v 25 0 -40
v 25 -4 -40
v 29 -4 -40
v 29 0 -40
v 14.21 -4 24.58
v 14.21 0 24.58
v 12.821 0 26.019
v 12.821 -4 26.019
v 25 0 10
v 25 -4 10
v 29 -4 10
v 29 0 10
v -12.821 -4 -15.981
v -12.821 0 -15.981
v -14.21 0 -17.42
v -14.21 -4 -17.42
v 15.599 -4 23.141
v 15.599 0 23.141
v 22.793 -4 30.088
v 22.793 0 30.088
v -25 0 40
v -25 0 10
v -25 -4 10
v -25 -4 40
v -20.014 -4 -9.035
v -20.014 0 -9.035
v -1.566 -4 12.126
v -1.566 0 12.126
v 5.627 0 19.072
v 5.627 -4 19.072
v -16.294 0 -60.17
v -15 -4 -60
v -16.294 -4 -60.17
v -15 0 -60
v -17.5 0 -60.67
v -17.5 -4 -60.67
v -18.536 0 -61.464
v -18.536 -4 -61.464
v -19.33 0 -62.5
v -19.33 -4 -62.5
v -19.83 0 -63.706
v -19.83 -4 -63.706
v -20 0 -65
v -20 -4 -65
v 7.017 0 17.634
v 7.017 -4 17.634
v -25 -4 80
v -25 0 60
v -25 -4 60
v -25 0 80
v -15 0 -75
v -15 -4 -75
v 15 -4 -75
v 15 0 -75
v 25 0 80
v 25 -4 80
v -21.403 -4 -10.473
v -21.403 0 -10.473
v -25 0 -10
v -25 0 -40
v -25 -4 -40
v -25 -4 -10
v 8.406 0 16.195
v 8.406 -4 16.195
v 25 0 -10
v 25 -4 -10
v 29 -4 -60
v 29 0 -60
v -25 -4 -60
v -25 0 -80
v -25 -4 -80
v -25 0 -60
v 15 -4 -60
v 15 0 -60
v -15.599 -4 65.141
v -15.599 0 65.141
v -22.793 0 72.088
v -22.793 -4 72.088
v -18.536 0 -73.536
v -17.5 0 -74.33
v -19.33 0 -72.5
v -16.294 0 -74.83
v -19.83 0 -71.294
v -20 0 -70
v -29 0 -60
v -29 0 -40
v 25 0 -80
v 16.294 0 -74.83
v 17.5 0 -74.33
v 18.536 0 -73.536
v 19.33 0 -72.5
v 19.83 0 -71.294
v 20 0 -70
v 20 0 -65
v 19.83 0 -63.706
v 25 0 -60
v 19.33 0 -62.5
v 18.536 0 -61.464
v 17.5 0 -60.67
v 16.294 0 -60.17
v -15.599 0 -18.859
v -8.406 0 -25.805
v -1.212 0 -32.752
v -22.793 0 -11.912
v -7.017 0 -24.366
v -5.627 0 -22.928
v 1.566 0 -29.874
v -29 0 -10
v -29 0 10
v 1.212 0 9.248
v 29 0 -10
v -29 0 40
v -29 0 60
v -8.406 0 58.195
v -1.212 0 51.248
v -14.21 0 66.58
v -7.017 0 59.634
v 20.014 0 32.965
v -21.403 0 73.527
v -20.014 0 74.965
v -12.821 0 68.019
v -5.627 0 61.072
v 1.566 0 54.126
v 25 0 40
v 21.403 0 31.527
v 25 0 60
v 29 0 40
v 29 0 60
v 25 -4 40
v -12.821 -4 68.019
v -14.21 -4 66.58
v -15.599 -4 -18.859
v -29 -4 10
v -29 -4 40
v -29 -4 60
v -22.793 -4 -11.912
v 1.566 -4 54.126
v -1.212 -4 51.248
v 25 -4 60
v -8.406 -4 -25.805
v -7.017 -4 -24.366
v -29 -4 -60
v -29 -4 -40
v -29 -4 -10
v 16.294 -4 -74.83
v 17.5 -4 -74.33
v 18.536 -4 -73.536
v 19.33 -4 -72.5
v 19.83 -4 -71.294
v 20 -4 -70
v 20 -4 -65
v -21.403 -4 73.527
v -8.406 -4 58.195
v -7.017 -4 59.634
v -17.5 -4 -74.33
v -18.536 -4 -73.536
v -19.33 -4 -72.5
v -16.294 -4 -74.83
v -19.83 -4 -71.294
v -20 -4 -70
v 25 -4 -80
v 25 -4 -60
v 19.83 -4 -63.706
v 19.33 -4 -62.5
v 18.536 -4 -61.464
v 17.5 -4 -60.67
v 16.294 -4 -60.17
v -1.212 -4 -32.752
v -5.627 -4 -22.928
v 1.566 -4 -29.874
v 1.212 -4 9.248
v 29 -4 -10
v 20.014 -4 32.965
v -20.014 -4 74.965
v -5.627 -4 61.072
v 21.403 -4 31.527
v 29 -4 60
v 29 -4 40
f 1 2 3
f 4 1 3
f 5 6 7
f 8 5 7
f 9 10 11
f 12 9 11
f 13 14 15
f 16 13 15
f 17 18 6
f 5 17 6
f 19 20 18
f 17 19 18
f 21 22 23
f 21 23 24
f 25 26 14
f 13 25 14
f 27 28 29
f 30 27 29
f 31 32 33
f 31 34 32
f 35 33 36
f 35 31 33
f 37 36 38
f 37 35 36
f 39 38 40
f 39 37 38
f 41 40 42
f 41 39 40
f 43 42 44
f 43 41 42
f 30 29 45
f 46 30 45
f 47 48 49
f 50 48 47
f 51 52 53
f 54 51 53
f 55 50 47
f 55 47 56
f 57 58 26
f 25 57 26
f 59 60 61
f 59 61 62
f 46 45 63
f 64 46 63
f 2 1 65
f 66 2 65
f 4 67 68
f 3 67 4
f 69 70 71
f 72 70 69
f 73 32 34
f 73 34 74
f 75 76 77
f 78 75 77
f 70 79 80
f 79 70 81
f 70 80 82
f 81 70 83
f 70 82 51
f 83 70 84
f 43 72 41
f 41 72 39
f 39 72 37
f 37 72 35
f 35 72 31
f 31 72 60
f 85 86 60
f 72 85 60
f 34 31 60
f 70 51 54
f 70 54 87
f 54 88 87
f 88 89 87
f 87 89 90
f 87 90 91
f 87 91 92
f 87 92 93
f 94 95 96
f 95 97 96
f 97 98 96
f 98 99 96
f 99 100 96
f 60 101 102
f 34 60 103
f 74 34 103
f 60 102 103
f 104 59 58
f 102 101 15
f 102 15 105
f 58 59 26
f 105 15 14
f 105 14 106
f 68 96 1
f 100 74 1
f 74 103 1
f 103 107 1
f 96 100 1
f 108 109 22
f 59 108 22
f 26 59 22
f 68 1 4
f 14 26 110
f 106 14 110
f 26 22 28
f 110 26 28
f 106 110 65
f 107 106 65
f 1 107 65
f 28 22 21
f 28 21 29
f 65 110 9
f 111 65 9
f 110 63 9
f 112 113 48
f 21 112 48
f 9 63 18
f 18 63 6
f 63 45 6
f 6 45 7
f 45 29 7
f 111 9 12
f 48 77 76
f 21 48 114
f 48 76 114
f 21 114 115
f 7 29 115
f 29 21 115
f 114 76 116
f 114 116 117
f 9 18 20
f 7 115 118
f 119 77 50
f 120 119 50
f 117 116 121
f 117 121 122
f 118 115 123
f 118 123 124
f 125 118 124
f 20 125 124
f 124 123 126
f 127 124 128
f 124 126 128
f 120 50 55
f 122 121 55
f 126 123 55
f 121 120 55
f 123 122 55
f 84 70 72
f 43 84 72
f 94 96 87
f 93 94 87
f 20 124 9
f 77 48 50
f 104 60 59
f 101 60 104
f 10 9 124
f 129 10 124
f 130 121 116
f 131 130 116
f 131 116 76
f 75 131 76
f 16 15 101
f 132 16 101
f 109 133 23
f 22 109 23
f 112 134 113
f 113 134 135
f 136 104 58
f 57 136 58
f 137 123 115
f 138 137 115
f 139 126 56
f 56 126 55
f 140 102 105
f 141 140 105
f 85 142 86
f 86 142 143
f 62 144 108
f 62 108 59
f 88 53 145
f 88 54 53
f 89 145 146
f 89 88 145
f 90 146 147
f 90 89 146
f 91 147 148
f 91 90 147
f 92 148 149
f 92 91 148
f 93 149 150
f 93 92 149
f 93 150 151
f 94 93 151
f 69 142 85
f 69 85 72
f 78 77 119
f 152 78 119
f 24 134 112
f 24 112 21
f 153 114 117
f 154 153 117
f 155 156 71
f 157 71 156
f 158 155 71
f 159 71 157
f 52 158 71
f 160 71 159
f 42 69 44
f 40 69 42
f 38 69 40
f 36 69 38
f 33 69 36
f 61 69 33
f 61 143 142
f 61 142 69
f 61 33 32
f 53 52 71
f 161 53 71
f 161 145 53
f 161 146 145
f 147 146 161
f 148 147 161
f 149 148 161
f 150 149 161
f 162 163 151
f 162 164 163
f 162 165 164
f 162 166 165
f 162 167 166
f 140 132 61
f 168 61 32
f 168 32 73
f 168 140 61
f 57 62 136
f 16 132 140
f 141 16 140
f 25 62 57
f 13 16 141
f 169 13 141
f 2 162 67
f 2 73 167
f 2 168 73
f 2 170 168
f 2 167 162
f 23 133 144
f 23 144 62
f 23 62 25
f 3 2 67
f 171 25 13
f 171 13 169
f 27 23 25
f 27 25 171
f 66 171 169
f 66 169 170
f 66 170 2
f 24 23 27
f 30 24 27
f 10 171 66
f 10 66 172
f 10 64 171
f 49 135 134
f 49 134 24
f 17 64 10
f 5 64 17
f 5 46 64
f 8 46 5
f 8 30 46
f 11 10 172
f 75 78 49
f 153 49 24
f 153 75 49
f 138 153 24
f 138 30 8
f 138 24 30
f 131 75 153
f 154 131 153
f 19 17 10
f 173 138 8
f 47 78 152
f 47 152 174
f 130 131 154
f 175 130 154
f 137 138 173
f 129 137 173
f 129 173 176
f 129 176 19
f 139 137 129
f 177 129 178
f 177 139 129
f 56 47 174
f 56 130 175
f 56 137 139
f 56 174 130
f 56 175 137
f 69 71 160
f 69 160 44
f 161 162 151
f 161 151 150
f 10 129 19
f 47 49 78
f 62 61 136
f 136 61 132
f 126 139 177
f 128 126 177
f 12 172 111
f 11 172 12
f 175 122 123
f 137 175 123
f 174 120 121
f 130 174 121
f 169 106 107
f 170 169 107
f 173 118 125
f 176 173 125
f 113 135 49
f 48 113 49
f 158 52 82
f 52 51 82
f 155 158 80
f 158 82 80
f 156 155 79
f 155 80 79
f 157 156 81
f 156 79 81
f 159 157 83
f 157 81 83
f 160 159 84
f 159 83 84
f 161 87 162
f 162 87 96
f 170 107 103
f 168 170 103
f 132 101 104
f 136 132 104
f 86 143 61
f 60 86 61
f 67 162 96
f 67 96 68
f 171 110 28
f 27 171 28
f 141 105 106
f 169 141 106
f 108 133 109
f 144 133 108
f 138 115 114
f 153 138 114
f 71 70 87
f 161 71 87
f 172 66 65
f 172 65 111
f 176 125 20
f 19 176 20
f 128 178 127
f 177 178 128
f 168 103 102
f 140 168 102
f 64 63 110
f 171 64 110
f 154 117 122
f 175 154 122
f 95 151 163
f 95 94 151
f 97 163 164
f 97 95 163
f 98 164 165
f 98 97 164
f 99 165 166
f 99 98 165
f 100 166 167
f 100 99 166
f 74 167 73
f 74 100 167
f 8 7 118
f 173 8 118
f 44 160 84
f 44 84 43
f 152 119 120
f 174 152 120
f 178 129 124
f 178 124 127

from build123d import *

# Parameters (mm, degrees)
F0_W     = 50
F0_H     = 160
F1_DEPTH = 4
F2_W     = 4
F2_H     = 20
F2_H_2   = 10
F3_DEPTH = 4
F4_W     = 40
F4_H     = 15
F5_DEPTH = 25
F6_R     = 5


with BuildPart() as f1:
    # F0 (on Front) → F1 (new body)
    with BuildSketch(Plane.XZ):
        Rectangle(F0_W, F0_H)
        Polygon((-21.403301, -10.473292), (-20.013984, -9.034612), (-12.820586, -15.981196), (-14.209903, -17.419876), (-15.59922, -18.858555), (-22.792618, -11.911971), align=None, mode=Mode.SUBTRACT)
        Polygon((-1.212424, -32.751723), (-8.405822, -25.805139), (-7.016505, -24.366459), (-5.627188, -22.92778), (1.56621, -29.874363), (0.176893, -31.313043), align=None, mode=Mode.SUBTRACT)
        Polygon((-22.792618, 72.088029), (-21.403301, 73.526708), (-20.013984, 74.965388), (-12.820586, 68.018804), (-14.209903, 66.580124), (-15.59922, 65.141445), align=None, mode=Mode.SUBTRACT)
        Polygon((-8.405822, 58.194861), (-7.016505, 59.633541), (-5.627188, 61.07222), (1.56621, 54.125637), (0.176893, 52.686957), (-1.212424, 51.248277), align=None, mode=Mode.SUBTRACT)
        Polygon((5.627188, 19.07222), (7.016505, 17.633541), (8.405822, 16.194861), (1.212424, 9.248277), (-0.176893, 10.686957), (-1.56621, 12.125637), align=None, mode=Mode.SUBTRACT)
        Polygon((20.013984, 32.965388), (21.403301, 31.526708), (22.792618, 30.088029), (15.59922, 23.141445), (14.209903, 24.580124), (12.820586, 26.018804), align=None, mode=Mode.SUBTRACT)
    extrude(amount=F1_DEPTH)

    # F2 (on face) → F3 (join)
    with BuildSketch(Plane.XZ.offset(4)):
        with Locations((-27, 50)):
            Rectangle(F2_W, F2_H)
        with Locations((-27, -5)):
            Rectangle(F2_W, F2_H_2)
        with Locations((-27, 5)):
            Rectangle(F2_W, F2_H_2)
        with Locations((-27, -50)):
            Rectangle(F2_W, F2_H)
        with Locations((27, 5)):
            Rectangle(F2_W, F2_H_2)
        with Locations((27, -5)):
            Rectangle(F2_W, F2_H_2)
        with Locations((27, 50)):
            Rectangle(F2_W, F2_H)
        with Locations((27, -50)):
            Rectangle(F2_W, F2_H)
    extrude(amount=-F3_DEPTH)

    # F4 (on face) → F5 (cut)
    with BuildSketch(Plane.XZ.offset(4)):
        with Locations((0, -67.5)):
            Rectangle(F4_W, F4_H)
    extrude(amount=-F5_DEPTH, mode=Mode.SUBTRACT)

    # F6
    f6_edges = [f1.edges().sort_by_distance(p)[0] for p in [
        (-20, -2, -60),
        (20, -2, -60),
        (20, -2, -75),
        (-20, -2, -75),
    ]]
    fillet(f6_edges, radius=F6_R)


solid = f1.part
